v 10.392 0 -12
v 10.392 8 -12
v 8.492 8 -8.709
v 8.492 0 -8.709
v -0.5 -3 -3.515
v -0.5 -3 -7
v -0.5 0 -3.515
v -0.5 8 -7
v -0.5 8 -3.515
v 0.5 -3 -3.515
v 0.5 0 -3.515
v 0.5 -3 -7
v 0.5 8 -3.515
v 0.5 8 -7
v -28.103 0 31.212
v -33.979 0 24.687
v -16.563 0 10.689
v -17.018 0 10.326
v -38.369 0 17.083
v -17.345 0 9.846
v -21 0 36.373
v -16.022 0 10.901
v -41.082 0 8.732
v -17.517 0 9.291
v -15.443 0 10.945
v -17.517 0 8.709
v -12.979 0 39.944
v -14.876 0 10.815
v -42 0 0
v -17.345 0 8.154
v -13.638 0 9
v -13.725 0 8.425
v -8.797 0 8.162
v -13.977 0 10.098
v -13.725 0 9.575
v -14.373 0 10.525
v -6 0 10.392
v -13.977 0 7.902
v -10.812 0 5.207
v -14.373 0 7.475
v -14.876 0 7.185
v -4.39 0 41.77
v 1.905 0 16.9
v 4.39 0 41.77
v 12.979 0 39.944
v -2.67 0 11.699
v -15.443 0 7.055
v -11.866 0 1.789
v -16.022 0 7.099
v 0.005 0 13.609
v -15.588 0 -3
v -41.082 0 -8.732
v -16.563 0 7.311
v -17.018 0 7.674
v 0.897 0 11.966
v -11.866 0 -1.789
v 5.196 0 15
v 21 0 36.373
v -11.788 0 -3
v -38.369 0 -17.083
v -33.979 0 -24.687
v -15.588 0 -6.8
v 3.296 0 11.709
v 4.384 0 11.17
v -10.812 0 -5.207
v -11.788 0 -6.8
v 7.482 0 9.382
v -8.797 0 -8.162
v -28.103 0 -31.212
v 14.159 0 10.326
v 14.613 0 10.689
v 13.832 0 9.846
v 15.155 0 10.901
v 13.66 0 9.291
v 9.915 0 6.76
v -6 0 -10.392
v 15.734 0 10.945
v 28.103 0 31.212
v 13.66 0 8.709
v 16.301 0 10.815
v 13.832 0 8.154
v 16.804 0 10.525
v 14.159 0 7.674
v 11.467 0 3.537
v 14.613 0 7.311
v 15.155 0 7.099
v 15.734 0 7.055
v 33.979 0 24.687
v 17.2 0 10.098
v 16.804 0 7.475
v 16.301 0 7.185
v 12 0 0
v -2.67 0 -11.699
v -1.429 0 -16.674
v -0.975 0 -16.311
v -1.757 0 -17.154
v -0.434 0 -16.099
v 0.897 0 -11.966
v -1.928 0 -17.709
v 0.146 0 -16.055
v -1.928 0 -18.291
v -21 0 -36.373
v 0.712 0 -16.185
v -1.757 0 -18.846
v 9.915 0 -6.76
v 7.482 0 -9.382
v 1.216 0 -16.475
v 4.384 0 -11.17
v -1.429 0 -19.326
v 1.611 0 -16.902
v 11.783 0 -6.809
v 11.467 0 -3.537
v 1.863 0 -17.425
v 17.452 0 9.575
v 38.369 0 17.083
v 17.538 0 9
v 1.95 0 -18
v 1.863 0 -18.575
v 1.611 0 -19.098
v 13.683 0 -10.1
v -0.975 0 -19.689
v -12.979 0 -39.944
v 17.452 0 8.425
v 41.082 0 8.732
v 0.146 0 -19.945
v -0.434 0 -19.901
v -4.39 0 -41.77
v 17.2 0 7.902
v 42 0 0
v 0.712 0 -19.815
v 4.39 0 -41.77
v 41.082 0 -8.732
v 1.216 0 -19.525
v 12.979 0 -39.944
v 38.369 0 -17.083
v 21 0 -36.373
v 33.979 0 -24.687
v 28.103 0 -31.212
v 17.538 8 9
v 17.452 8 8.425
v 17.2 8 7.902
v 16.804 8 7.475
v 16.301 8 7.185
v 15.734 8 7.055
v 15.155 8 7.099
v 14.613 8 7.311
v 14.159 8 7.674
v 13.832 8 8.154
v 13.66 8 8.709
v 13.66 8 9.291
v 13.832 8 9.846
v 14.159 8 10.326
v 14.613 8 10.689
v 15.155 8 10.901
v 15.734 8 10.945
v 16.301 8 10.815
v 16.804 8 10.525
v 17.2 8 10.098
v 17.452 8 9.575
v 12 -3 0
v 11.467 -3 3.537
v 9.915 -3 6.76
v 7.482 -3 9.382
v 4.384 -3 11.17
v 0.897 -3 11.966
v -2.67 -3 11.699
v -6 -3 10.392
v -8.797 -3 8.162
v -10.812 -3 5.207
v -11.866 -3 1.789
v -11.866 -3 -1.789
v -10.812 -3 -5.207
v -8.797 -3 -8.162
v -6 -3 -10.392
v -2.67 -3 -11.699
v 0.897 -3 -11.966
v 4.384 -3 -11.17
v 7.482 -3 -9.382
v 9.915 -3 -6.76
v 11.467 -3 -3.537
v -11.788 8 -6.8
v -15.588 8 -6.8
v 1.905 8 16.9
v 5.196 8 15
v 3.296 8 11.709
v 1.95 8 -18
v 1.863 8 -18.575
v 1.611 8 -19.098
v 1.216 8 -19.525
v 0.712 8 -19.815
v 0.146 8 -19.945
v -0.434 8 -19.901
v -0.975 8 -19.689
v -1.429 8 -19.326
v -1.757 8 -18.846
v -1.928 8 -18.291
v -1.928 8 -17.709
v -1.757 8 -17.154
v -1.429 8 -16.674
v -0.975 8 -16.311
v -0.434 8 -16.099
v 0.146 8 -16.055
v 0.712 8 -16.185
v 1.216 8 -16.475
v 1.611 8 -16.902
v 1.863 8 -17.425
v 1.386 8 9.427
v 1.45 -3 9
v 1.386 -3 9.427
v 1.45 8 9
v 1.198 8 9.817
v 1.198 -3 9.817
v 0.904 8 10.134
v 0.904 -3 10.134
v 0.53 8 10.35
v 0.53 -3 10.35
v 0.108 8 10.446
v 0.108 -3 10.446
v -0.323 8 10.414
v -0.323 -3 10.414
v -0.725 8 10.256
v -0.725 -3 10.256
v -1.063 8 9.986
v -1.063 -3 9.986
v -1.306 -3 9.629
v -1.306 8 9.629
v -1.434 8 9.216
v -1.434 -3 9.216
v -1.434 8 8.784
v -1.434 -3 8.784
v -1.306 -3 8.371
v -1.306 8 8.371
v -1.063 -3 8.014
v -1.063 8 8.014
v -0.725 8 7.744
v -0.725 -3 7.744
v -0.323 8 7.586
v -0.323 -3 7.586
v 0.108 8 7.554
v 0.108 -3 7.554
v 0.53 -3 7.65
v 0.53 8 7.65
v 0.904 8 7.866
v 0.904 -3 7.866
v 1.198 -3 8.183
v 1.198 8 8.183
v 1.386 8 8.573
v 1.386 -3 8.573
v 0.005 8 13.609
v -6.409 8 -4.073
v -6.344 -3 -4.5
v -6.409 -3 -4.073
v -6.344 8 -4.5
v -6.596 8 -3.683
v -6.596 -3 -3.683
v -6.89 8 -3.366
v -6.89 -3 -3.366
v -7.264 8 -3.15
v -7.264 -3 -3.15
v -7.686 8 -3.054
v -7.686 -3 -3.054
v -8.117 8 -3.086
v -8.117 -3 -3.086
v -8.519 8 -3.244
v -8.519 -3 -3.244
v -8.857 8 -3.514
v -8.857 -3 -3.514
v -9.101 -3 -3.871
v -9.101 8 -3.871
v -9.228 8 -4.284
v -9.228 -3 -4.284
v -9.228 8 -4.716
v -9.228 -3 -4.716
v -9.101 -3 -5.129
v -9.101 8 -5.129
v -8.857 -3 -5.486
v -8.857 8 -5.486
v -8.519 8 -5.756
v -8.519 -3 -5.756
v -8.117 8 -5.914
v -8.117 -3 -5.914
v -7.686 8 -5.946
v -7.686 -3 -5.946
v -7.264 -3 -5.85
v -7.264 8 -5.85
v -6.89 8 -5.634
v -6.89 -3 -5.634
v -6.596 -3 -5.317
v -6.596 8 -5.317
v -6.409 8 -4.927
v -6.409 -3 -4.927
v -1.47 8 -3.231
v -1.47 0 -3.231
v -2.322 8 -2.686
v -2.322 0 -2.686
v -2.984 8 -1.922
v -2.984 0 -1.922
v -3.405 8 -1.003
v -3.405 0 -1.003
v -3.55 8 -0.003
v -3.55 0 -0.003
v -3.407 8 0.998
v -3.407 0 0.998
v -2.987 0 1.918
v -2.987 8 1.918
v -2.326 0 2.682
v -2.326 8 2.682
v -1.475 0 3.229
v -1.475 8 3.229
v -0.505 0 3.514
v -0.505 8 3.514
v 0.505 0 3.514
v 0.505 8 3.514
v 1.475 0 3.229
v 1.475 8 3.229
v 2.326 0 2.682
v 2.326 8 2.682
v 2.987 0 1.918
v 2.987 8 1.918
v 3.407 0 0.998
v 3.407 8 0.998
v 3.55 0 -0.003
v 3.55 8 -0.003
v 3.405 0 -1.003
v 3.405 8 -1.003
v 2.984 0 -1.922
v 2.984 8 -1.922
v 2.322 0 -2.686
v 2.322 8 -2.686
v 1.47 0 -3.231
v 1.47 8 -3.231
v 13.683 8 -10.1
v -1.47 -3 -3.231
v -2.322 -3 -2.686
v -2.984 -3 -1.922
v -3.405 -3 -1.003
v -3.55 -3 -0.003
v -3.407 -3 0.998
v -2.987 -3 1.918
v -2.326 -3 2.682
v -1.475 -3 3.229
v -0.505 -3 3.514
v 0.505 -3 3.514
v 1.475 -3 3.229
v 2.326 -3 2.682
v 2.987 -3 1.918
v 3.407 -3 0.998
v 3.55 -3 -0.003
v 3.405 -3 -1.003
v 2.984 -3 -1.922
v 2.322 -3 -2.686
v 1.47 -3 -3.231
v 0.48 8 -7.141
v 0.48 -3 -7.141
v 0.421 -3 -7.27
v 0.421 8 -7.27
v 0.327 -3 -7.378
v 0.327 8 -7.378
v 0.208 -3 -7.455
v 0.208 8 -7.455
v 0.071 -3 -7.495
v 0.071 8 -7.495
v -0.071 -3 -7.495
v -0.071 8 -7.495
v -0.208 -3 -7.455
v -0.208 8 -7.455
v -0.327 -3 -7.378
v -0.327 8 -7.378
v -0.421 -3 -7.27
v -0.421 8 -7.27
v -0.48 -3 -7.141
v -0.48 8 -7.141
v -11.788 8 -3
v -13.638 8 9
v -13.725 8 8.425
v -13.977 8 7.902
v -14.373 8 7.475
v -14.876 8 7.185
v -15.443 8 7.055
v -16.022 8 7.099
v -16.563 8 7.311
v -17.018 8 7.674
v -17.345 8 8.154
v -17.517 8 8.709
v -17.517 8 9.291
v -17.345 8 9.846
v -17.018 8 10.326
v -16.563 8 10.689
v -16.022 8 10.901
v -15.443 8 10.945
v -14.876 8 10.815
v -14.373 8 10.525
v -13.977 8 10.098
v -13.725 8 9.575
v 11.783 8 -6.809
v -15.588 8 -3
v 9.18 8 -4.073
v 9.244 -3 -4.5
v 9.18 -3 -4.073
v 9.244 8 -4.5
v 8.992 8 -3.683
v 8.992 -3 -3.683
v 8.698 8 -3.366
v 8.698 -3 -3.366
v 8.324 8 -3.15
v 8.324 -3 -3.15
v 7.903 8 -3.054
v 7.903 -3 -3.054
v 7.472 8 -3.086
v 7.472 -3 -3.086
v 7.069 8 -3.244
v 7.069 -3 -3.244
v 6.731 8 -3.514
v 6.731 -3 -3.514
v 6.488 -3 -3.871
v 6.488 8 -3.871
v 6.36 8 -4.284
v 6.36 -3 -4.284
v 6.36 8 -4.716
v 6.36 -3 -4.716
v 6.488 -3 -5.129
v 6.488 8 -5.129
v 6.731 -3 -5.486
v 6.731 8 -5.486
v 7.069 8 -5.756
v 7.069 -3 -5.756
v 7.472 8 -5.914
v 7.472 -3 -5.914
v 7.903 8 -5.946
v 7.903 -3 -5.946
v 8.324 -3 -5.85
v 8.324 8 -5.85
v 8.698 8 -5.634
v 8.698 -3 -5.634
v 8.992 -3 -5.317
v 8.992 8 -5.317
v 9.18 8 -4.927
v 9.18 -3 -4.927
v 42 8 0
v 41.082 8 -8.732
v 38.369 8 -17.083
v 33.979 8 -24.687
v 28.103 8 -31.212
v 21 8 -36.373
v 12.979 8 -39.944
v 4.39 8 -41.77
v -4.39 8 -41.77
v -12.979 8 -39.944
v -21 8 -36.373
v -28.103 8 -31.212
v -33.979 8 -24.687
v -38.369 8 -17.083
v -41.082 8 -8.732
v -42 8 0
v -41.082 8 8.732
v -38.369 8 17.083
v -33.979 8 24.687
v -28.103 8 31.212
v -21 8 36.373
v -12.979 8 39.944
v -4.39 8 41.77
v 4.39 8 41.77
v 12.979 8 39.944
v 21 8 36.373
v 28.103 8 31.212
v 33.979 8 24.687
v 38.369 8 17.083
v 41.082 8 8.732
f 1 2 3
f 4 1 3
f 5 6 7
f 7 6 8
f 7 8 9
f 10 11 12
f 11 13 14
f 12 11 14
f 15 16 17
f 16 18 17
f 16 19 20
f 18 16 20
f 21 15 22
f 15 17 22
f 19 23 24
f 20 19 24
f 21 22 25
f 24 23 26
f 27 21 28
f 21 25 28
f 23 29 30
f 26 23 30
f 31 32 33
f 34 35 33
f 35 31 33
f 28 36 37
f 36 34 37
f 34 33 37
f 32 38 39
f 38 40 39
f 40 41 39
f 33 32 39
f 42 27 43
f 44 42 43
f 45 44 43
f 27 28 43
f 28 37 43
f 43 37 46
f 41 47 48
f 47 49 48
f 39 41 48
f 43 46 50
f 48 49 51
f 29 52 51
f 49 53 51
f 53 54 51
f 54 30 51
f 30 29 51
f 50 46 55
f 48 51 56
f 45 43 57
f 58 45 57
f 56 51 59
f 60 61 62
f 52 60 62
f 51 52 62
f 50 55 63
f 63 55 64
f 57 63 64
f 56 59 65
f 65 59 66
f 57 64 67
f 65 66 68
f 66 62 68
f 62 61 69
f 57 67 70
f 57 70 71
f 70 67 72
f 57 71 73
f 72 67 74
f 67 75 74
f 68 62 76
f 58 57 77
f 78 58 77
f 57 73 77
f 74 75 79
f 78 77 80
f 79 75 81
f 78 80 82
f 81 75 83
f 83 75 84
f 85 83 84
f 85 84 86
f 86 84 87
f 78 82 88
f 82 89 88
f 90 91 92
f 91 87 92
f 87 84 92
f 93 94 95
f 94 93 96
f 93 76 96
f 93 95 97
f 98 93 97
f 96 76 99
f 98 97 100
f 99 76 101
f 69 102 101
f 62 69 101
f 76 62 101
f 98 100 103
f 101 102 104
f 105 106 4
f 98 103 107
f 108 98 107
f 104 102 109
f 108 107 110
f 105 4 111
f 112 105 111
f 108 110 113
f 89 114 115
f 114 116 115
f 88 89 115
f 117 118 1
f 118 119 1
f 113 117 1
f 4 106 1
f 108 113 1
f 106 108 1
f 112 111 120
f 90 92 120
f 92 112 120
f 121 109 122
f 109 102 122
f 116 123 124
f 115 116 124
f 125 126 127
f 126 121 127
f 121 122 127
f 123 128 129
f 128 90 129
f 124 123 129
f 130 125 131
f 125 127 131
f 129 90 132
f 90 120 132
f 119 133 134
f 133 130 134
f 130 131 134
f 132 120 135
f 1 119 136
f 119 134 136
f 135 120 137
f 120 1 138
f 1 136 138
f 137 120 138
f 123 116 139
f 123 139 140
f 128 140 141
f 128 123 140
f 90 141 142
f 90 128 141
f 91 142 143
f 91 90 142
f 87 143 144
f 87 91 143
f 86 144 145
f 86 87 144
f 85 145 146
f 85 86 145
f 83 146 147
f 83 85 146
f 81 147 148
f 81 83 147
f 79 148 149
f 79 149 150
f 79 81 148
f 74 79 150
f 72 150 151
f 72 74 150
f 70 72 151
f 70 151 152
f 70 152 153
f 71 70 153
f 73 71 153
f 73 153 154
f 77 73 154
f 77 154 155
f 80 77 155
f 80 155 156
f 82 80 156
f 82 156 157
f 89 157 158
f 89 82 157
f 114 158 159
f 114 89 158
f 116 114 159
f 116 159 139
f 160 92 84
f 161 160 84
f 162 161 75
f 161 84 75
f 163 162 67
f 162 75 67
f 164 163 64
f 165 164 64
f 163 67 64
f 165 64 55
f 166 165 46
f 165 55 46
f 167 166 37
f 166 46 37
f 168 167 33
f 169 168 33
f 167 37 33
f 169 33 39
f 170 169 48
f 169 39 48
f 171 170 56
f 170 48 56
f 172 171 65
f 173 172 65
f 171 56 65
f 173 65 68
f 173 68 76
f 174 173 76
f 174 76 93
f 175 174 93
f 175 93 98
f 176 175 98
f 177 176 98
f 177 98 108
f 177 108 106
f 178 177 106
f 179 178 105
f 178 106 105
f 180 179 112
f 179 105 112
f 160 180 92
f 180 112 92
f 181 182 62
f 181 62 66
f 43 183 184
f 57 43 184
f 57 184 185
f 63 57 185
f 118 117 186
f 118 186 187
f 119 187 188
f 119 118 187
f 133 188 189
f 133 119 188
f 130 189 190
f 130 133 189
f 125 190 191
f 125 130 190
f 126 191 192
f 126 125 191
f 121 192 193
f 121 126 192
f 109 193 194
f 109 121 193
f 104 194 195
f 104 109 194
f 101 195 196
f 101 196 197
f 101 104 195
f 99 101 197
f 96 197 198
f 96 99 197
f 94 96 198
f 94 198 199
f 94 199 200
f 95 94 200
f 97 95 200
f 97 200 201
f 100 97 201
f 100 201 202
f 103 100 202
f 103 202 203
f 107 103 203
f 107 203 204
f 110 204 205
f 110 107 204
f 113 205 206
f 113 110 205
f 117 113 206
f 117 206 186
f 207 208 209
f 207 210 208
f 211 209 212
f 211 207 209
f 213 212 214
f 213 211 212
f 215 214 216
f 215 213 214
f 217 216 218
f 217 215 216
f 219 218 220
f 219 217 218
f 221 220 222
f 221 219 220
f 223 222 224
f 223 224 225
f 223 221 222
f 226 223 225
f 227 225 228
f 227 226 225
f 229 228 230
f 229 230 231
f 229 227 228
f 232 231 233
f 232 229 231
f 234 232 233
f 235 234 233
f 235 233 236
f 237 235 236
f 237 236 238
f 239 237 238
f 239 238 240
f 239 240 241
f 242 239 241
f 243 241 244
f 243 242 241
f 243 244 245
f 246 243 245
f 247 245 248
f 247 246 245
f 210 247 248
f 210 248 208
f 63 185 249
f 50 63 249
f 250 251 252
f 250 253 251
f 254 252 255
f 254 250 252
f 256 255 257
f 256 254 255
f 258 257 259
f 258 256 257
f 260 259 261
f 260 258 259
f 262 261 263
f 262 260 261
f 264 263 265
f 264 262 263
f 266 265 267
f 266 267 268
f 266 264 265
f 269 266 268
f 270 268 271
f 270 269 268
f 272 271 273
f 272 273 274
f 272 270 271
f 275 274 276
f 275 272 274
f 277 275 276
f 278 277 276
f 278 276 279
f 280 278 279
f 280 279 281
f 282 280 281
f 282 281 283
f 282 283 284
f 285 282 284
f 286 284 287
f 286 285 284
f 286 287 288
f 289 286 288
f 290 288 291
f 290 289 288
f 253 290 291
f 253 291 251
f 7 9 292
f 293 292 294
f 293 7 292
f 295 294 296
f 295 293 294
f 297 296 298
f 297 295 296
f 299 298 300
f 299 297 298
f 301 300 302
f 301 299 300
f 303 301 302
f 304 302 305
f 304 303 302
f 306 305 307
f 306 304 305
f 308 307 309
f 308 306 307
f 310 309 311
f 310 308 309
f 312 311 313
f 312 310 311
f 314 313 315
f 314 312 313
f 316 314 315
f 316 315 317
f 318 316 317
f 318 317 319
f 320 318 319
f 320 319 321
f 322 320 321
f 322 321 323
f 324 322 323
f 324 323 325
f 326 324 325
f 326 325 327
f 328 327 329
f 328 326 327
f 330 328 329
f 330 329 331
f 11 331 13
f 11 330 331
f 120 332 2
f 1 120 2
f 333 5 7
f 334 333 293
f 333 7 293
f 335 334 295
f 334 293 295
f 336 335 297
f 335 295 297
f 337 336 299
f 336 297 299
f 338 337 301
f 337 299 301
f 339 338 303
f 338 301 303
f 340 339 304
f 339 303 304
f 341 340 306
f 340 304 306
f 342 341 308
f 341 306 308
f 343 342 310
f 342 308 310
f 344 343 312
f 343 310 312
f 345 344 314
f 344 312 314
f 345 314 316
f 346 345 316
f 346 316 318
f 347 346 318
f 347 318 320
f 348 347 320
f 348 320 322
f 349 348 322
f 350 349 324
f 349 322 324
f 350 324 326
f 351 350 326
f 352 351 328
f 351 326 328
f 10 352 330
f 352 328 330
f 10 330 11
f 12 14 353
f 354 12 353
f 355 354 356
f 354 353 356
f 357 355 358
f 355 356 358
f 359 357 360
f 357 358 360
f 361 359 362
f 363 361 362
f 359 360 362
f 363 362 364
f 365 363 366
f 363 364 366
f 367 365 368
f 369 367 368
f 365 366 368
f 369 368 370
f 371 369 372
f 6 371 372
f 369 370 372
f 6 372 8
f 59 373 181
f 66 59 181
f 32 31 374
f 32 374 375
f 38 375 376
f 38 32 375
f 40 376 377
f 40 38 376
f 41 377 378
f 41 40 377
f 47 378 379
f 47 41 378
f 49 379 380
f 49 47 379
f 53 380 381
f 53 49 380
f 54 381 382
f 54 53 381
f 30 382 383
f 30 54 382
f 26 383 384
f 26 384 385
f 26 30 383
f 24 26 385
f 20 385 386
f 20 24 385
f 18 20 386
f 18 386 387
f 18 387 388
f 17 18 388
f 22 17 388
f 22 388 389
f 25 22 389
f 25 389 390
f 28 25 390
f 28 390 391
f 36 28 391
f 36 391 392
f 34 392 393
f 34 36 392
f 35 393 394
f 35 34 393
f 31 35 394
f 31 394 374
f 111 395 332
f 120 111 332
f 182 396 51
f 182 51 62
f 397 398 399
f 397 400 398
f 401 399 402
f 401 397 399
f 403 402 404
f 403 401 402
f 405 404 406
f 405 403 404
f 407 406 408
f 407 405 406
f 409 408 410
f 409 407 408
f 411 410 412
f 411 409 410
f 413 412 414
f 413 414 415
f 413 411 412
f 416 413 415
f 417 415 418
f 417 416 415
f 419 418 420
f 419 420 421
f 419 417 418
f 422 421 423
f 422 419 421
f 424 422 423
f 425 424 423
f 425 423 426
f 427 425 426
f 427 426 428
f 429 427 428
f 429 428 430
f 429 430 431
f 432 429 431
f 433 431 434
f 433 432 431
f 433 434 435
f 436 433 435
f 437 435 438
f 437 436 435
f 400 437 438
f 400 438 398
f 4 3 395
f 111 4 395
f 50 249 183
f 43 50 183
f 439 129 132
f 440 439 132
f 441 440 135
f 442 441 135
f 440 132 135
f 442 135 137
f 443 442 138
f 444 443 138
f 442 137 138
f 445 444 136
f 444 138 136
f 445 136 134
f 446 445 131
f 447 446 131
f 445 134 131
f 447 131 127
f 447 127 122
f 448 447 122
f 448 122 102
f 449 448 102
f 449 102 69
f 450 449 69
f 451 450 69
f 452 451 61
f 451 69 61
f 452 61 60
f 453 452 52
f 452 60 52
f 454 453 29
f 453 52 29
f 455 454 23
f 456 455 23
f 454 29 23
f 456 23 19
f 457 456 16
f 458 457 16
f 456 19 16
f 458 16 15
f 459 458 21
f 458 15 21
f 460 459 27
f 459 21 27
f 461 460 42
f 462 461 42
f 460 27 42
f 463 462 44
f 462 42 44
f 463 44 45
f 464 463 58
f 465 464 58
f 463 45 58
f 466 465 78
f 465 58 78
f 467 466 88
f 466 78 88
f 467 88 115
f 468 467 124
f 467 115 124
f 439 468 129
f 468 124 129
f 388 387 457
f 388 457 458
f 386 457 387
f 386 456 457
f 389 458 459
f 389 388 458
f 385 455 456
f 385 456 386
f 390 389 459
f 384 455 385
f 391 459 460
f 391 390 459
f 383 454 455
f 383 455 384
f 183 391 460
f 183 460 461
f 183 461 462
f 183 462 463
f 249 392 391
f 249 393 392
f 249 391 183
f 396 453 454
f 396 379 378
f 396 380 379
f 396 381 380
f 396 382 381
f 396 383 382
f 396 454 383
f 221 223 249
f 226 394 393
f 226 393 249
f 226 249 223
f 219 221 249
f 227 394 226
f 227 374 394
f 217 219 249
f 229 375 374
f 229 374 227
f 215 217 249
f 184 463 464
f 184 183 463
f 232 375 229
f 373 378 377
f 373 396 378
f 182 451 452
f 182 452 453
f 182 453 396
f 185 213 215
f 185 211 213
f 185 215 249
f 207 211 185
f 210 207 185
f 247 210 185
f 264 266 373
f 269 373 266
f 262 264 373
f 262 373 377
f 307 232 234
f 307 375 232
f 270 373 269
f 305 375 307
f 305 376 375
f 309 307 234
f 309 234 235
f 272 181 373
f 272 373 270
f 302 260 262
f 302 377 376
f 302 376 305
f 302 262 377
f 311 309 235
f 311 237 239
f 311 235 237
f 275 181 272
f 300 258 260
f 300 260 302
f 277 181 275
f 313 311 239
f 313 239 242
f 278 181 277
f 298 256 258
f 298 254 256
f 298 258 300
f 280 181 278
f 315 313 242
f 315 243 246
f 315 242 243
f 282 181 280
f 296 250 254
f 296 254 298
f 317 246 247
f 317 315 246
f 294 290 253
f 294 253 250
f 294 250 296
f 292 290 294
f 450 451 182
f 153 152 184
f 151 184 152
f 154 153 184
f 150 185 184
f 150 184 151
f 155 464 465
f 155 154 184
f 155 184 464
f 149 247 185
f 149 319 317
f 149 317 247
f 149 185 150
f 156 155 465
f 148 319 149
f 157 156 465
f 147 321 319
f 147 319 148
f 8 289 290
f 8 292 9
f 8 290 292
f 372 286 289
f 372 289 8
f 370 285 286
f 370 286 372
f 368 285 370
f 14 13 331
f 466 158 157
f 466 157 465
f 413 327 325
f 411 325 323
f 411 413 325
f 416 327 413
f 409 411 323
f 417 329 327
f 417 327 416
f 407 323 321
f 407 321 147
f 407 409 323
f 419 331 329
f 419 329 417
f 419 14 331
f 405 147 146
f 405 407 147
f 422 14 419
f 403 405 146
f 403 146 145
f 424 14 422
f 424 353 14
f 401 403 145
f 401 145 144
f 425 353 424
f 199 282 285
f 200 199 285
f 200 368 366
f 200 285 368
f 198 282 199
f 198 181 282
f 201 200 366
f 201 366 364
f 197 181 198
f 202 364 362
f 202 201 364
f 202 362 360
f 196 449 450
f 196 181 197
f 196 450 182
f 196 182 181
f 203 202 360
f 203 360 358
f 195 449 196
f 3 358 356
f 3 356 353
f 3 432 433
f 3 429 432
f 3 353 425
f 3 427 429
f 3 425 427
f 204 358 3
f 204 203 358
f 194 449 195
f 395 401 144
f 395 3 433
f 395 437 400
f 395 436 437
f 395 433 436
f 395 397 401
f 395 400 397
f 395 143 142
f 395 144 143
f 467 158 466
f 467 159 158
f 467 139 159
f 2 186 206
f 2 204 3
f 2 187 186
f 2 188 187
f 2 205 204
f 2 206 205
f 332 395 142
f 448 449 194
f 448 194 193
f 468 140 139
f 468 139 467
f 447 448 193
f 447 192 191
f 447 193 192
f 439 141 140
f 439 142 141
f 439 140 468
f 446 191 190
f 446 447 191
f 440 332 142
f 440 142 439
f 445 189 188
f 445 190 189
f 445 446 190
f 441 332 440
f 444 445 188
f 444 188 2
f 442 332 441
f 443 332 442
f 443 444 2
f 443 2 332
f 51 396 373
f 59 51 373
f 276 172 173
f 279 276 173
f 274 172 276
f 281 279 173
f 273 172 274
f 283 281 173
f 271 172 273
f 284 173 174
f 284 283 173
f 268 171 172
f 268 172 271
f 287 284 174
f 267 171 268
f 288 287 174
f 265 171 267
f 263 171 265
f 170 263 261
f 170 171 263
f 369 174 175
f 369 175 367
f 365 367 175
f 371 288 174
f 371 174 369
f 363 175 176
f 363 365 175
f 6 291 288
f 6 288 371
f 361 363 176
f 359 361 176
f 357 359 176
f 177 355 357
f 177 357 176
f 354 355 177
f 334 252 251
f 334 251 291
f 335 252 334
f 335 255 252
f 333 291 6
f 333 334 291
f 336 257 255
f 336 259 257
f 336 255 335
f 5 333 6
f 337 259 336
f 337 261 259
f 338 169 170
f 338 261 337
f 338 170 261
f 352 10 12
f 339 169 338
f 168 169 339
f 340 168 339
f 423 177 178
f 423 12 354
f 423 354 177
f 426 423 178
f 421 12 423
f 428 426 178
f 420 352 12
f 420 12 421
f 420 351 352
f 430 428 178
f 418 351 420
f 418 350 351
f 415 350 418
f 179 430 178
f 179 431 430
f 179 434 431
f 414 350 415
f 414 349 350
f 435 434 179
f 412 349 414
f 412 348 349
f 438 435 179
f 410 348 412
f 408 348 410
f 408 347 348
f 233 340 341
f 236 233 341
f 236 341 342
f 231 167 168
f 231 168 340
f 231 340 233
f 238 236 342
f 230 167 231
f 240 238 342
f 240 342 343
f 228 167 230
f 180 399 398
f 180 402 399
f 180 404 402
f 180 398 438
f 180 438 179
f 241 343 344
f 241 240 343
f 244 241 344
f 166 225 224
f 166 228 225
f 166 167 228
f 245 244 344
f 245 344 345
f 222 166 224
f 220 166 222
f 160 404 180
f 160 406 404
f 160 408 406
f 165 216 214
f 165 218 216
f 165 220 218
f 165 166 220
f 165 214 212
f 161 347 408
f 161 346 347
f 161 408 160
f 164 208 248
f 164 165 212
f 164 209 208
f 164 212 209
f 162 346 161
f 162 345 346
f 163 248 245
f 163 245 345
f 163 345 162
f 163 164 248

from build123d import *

# Parameters (mm, degrees)
SKETCH1_R           = 42
SKETCH1_R_2         = 1.95
SKETCH1_R_3         = 3.55
SKETCH1_R_4         = 1.45
BOSS_EXTRUDE1_DEPTH = 8
CUT_EXTRUDE2_DEPTH  = 10
SKETCH4_W           = 3.8
SKETCH4_H           = 3.8
CUT_EXTRUDE3_DEPTH  = 35
SKETCH5_R           = 12
SKETCH5_R_2         = 1.45
BOSS_EXTRUDE2_DEPTH = 3


with BuildPart() as part:
    # Sketch1 → Boss-Extrude1 (new body)
    with BuildSketch(Plane(origin=(0, 0, 0), x_dir=(1, 0, 0), z_dir=(0, 1, 0))):
        Circle(SKETCH1_R)
        with Locations((0, 18)):
            Circle(SKETCH1_R_2, mode=Mode.SUBTRACT)
        with Locations((15.588457268, -9)):
            Circle(SKETCH1_R_2, mode=Mode.SUBTRACT)
        with Locations((-15.588457268, -9)):
            Circle(SKETCH1_R_2, mode=Mode.SUBTRACT)
        Circle(SKETCH1_R_3, mode=Mode.SUBTRACT)
        with Locations((7.794228634, 4.5)):
            Circle(SKETCH1_R_4, mode=Mode.SUBTRACT)
        with Locations((0, -9)):
            Circle(SKETCH1_R_4, mode=Mode.SUBTRACT)
        with Locations((-7.794228634, 4.5)):
            Circle(SKETCH1_R_4, mode=Mode.SUBTRACT)
    extrude(amount=BOSS_EXTRUDE1_DEPTH)

    # Sketch3 → Cut-Extrude2 (cut)
    with BuildSketch(Plane(origin=(0, 8, 0), x_dir=(1, 0, 0), z_dir=(0, 1, 0))):
        with BuildLine():
            Line((0.5, 7), (0.5, 0))
            ThreePointArc((0.5, 0), (0, -0.5), (-0.5, 0))
            Line((-0.5, 0), (-0.5, 7))
            ThreePointArc((-0.5, 7), (0, 7.5), (0.5, 7))
        make_face()
    extrude(amount=-CUT_EXTRUDE2_DEPTH, mode=Mode.SUBTRACT)

    # Sketch4 → Cut-Extrude3 (cut)
    with BuildSketch(Plane(origin=(0, 8, 0), x_dir=(1, 0, 0), z_dir=(0, 1, 0))):
        Polygon((1.905255888, -16.9), (5.196152423, -15), (3.296152423, -11.709103466), (0.005255888, -13.609103466), align=None)
        with Locations((-13.688457268, 4.9)):
            Rectangle(SKETCH4_W, SKETCH4_H)
        Polygon((13.68320138, 10.1), (10.392304845, 12), (8.492304845, 8.709103466), (11.78320138, 6.809103466), align=None)
    extrude(amount=-CUT_EXTRUDE3_DEPTH, mode=Mode.SUBTRACT)

    # Sketch5 → Boss-Extrude2 (add)
    with BuildSketch(Plane.XZ):
        Circle(SKETCH5_R)
        with Locations((0, 9)):
            Circle(SKETCH5_R_2, mode=Mode.SUBTRACT)
        with Locations((-7.794228634, -4.5)):
            Circle(SKETCH5_R_2, mode=Mode.SUBTRACT)
        with Locations((7.794228634, -4.5)):
            Circle(SKETCH5_R_2, mode=Mode.SUBTRACT)
        with BuildLine():
            Line((-0.5, -7), (-0.5, -3.514612354))
            ThreePointArc((-0.5, -3.514612354), (0, 3.55), (0.5, -3.514612354))
            Line((0.5, -3.514612354), (0.5, -7))
            ThreePointArc((0.5, -7), (0, -7.5), (-0.5, -7))
        make_face(mode=Mode.SUBTRACT)
    extrude(amount=BOSS_EXTRUDE2_DEPTH)


solid = part.part
